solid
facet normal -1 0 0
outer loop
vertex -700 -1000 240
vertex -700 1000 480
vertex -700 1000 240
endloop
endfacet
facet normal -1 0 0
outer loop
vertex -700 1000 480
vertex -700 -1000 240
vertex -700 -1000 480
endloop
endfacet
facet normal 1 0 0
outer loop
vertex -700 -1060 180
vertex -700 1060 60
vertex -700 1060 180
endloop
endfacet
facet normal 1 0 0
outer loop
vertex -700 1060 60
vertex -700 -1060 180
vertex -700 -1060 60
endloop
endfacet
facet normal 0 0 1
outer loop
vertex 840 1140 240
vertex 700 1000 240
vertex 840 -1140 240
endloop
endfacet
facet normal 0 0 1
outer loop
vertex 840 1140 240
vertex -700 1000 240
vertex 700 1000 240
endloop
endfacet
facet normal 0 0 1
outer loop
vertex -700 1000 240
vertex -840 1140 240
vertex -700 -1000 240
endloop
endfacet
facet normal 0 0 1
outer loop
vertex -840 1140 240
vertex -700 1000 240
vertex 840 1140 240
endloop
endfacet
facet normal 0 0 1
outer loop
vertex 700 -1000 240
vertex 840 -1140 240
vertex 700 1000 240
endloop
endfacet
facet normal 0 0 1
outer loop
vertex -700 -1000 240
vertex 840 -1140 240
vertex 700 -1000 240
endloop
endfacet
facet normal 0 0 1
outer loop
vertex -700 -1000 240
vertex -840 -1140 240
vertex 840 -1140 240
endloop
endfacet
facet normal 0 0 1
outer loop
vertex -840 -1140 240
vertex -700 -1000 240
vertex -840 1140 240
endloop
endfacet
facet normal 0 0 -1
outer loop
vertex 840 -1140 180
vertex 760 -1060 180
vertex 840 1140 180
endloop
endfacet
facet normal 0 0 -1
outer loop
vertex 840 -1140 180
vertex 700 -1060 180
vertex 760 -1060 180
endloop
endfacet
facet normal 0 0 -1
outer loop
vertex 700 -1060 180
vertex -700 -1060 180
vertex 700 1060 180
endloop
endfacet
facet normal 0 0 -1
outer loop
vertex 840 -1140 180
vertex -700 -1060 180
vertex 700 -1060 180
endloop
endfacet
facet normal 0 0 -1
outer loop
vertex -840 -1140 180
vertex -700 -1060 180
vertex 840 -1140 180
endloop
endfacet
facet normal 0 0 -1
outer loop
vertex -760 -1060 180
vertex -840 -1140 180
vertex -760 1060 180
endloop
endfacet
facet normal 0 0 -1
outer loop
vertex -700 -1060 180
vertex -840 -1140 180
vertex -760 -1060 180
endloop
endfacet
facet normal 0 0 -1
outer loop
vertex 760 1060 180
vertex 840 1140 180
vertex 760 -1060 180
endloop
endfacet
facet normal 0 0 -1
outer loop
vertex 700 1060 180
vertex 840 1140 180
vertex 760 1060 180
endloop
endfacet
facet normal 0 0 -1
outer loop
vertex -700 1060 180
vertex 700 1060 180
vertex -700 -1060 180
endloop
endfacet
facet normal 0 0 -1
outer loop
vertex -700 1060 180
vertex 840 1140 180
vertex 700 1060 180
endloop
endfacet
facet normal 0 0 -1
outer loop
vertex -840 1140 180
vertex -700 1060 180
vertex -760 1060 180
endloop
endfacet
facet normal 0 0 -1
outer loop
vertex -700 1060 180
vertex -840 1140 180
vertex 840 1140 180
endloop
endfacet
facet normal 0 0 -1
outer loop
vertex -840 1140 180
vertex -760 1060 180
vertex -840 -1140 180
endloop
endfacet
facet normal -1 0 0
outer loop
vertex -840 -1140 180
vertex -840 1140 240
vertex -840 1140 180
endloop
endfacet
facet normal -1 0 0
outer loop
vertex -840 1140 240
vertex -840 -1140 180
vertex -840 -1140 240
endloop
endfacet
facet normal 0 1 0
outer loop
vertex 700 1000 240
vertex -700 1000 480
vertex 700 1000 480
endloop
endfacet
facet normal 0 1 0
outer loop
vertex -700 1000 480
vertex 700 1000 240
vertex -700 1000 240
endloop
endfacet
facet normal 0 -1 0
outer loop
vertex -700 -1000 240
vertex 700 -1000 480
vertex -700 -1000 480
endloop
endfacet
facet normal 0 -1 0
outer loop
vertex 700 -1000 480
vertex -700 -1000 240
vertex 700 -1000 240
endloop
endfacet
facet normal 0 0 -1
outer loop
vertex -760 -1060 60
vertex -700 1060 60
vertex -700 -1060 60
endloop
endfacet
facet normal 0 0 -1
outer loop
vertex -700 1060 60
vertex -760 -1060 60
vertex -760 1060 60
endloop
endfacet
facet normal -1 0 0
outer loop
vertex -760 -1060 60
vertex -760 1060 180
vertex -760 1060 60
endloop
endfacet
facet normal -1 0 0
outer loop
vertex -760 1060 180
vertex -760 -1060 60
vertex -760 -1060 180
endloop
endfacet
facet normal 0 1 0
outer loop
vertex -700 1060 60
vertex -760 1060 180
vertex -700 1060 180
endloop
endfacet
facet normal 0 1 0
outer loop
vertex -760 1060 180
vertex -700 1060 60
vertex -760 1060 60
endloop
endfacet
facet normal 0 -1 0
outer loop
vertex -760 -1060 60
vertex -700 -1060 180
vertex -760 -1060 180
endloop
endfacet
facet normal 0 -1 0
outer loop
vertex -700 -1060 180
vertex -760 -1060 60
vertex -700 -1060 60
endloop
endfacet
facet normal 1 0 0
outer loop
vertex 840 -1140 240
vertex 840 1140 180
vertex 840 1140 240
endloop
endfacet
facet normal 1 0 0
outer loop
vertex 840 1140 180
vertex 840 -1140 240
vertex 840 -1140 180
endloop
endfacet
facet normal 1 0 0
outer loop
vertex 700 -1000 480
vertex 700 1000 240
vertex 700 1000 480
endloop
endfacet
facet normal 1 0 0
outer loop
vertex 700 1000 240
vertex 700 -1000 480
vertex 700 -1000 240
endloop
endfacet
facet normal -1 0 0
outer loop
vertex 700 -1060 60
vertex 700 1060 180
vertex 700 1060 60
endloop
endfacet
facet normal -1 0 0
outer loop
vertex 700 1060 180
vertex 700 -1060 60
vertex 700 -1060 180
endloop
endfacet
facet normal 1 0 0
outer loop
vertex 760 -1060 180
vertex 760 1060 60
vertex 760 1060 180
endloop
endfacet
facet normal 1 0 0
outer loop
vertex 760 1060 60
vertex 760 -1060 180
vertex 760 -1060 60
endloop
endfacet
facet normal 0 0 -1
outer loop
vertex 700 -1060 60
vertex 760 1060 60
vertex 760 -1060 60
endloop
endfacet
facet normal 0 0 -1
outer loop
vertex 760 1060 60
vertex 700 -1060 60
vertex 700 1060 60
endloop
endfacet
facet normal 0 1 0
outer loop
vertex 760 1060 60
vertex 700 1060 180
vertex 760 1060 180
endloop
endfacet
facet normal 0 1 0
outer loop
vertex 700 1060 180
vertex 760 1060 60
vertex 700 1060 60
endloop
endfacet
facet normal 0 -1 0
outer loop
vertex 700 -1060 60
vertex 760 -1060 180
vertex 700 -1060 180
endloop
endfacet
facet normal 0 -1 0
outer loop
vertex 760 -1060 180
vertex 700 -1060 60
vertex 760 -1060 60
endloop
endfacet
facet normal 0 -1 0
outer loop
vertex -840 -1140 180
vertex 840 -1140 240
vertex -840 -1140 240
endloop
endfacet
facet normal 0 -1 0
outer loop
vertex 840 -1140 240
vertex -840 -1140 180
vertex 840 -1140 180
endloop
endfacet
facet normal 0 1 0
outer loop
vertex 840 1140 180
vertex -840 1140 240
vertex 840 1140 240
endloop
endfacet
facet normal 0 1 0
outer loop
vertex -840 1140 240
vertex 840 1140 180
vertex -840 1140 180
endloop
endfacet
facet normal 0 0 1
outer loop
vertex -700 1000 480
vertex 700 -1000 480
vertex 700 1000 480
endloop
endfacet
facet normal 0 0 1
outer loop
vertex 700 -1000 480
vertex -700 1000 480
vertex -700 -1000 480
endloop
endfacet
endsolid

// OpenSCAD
matrDims=[1400,2000,300];
topBeamDims=[140,0,60];
frmBeamDims=[120,0,60];
frameTopHght=240; 
frameDims=[1600,2200,240];
footDia=80;

color("ivory") translate([0,0,matrDims.z/2+frameDims.z-topBeamDims.z]) cube(matrDims,true);

  color("burlyWood") for(ix=[-1,1]){
    translate([ix*(matrDims.x+topBeamDims.x)/2,0,frameTopHght-topBeamDims.z/2]) 
      cube([topBeamDims.x,matrDims.y,topBeamDims.z],true);
    translate([ix*(matrDims.x+frmBeamDims.z)/2,0,frameTopHght-topBeamDims.z-frmBeamDims.x/2]) 
      cube([frmBeamDims.z,matrDims.y+frmBeamDims.z*2,frmBeamDims.x],true);
  }
    
  color("tan") for(iy=[-1,1])
    translate([0,iy*(matrDims.y+topBeamDims.x)/2,frameTopHght-topBeamDims.z/2]) 
      cube([matrDims.x+topBeamDims.x*2,topBeamDims.x,topBeamDims.z],true);
    
  //feet
  *color("burlywood") for (ix=[-1,1],iy=[-1,1])
    translate([ix*(matrDims.x+topBeamDims.x)/2,iy*(matrDims.y+topBeamDims.x)/2,0]) cylinder(d=footDia,h=frameTopHght-topBeamDims.z);



//calculate volume
sidesVol=(topBeamDims.x*topBeamDims.z*matrDims.y)/(1000*1000*1000);
facesVol=(topBeamDims.x*topBeamDims.z*matrDims.x)/(1000*1000*1000);
ovVol=sidesVol+facesVol;
cubicPrice=1415; //€/m³
echo(str("Volume: ",sidesVol,"m³"));
echo(str("Cost: ",ovVol*cubicPrice,"€"));
